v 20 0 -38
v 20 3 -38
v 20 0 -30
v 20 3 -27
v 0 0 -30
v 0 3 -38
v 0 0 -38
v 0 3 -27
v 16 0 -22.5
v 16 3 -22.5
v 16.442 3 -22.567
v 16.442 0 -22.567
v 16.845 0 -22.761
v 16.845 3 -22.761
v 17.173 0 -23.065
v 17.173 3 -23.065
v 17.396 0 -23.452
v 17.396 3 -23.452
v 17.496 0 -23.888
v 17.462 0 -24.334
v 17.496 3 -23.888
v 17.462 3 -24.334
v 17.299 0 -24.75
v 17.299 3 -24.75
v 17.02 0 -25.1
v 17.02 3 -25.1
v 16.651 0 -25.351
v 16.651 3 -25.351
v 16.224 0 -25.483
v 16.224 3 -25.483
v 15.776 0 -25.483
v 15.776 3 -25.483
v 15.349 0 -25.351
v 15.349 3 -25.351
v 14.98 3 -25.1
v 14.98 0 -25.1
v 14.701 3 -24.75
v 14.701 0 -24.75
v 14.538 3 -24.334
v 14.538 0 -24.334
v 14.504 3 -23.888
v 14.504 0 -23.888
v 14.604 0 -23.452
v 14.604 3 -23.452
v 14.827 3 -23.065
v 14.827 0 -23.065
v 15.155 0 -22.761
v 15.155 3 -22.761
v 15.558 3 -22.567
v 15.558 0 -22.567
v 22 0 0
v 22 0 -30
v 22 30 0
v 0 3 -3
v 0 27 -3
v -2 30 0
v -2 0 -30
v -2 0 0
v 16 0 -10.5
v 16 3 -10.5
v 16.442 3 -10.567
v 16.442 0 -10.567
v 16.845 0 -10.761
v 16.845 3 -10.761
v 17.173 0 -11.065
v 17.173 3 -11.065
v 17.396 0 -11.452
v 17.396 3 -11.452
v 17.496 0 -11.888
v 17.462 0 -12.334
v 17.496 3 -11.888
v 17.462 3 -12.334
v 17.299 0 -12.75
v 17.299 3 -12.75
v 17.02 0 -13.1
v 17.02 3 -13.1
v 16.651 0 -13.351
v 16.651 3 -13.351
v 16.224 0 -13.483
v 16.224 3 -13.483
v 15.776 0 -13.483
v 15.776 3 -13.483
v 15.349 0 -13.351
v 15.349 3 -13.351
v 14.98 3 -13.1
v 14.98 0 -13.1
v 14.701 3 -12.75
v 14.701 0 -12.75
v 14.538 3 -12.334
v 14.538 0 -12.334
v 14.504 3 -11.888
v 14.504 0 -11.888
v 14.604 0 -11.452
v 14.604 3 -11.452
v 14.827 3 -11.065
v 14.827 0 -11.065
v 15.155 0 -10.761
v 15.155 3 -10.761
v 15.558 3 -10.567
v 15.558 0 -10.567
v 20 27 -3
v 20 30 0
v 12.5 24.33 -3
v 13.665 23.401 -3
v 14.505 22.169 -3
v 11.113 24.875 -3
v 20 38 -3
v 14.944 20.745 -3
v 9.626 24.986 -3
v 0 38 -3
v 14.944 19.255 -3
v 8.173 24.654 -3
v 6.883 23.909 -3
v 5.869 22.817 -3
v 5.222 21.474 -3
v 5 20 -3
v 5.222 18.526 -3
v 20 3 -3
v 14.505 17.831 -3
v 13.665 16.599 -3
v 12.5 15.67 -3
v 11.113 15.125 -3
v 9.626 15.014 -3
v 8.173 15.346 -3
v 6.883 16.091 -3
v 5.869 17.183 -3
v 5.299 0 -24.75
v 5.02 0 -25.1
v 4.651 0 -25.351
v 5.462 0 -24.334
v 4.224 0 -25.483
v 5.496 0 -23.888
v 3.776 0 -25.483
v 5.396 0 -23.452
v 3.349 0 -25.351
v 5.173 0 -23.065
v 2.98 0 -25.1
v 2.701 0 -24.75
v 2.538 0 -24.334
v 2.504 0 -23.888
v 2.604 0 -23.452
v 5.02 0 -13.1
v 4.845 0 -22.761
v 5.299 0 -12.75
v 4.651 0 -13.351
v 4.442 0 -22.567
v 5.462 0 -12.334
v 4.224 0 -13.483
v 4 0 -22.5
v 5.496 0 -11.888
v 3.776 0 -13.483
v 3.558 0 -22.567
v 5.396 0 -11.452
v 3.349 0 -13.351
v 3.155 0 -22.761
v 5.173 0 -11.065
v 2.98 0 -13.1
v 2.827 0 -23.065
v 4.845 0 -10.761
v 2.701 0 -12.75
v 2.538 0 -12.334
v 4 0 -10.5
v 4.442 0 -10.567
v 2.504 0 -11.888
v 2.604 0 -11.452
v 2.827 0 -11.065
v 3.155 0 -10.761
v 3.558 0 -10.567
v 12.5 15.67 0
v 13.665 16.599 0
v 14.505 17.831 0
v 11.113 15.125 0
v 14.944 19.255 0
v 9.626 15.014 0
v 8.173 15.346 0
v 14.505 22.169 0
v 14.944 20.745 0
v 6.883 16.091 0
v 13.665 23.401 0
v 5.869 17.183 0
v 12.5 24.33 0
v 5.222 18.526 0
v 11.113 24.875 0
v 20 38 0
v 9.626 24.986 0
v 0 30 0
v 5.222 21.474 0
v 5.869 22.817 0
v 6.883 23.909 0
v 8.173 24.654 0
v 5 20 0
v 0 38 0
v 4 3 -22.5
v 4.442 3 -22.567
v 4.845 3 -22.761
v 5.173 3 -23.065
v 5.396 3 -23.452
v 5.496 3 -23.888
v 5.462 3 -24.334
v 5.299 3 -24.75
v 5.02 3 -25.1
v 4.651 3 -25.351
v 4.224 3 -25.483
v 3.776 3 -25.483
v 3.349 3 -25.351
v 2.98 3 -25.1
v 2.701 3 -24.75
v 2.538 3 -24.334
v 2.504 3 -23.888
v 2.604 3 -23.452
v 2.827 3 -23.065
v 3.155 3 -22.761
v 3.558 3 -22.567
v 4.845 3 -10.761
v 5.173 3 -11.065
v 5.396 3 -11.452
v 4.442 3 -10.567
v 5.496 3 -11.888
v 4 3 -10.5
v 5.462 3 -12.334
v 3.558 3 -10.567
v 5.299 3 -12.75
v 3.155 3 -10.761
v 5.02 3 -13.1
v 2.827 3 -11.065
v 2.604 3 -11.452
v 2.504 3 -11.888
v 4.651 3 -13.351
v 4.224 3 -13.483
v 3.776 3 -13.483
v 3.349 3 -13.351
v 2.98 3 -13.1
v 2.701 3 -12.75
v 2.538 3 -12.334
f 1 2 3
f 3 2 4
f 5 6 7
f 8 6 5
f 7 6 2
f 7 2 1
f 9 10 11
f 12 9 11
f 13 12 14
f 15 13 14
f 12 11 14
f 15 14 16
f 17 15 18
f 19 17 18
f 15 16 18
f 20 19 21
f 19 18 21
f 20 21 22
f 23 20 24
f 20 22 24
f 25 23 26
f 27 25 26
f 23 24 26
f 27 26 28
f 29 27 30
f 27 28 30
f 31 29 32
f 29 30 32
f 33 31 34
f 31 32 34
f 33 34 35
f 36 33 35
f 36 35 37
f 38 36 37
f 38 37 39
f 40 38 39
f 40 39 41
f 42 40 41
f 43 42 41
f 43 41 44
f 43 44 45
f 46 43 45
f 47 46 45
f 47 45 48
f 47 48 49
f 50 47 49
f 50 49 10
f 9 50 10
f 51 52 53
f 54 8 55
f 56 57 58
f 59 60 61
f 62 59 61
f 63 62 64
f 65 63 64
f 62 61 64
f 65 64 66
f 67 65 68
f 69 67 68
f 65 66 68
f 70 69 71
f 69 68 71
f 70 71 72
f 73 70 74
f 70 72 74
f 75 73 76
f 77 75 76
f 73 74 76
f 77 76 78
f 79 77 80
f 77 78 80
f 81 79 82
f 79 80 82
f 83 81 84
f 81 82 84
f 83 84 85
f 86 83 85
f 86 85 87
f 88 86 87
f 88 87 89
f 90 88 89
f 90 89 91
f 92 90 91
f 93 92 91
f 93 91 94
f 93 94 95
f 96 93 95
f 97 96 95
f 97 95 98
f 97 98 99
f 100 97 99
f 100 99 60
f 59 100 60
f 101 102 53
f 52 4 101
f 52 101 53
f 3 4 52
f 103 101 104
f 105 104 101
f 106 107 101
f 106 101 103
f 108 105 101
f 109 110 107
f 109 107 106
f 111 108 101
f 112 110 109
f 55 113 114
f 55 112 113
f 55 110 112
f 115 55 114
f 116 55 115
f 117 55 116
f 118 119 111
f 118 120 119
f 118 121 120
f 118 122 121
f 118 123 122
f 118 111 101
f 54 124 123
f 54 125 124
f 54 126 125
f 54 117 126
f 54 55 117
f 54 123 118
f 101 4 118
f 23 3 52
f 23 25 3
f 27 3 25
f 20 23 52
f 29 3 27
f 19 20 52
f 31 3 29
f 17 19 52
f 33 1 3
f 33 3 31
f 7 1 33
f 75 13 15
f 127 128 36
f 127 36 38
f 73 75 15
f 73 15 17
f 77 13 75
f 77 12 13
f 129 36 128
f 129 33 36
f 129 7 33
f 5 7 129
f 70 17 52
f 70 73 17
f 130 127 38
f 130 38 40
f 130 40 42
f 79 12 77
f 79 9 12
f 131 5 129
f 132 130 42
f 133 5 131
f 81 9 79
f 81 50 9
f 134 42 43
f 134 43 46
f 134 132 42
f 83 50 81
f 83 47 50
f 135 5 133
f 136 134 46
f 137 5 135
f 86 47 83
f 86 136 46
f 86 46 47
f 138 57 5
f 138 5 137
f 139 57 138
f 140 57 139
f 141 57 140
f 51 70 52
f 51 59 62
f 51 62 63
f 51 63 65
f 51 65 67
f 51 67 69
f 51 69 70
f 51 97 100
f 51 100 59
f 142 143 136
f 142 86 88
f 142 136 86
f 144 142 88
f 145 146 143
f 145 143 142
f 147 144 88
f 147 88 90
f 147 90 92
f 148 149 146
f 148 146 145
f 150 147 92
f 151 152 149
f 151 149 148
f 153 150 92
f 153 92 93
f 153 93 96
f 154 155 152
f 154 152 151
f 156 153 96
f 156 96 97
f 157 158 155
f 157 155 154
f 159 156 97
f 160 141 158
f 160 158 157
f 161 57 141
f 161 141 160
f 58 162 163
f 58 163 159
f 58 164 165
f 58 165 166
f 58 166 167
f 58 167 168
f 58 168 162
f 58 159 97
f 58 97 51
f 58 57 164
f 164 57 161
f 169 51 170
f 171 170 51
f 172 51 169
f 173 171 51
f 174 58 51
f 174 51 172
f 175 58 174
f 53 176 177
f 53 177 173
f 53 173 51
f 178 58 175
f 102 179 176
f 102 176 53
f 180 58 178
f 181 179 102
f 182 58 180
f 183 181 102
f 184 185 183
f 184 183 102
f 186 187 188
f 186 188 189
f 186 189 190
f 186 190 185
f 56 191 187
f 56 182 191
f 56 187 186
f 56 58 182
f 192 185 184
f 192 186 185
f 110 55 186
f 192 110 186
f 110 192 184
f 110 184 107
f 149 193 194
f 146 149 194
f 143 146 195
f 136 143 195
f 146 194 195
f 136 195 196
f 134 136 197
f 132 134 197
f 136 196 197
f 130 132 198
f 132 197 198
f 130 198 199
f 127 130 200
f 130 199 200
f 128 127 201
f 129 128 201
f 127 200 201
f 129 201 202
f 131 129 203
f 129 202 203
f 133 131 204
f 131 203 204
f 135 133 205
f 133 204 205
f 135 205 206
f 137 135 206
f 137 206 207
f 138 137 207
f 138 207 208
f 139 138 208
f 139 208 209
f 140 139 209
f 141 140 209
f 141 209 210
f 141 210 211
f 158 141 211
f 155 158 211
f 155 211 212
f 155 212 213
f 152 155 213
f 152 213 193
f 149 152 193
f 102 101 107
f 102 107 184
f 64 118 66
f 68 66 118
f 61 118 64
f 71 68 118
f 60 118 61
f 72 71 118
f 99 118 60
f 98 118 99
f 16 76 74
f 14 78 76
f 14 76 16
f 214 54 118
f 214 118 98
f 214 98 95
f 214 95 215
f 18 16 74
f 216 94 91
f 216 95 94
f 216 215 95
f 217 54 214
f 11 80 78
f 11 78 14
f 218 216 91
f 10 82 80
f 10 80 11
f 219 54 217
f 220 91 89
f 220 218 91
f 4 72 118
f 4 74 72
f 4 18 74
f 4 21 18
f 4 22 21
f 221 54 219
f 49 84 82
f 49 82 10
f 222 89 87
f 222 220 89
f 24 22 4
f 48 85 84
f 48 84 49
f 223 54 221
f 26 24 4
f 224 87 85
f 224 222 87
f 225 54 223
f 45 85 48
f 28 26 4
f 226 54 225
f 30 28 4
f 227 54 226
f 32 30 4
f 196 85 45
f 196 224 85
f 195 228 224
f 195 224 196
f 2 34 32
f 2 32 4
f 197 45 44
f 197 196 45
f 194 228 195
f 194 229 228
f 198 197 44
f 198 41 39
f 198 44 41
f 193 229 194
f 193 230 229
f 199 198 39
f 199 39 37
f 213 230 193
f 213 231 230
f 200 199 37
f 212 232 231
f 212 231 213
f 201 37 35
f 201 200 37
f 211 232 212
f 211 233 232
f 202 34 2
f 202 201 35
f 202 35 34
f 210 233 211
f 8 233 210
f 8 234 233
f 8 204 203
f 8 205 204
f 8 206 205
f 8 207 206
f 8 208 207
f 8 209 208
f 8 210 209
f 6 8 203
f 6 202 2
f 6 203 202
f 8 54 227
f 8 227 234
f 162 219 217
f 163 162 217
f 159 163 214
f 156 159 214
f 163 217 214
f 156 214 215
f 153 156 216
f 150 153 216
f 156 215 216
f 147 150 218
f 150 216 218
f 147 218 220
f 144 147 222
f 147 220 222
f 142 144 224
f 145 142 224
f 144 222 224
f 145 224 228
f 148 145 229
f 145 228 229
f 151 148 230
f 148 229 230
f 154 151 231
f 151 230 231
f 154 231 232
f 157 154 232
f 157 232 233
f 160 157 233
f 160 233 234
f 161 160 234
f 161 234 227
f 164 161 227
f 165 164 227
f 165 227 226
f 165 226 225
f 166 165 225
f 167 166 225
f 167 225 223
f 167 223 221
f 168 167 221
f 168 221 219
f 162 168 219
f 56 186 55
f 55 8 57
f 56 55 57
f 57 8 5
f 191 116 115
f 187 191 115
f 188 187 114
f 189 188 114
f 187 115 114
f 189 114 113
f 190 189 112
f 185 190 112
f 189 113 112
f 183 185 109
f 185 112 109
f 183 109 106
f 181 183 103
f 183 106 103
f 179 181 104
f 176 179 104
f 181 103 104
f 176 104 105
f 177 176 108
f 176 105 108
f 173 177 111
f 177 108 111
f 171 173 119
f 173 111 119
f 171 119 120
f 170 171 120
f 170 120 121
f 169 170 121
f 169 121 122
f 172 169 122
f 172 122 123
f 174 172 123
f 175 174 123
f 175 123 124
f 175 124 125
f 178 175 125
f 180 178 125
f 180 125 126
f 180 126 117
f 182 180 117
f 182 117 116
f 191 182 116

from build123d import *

# Parameters (mm, degrees)
EXTRUDE_1_DEPTH     = 20
SKETCH_3_R          = 1.5
CUT_EXTRUDE_1_DEPTH = 56.398555938
SKETCH_5_R          = 5
CUT_EXTRUDE_3_DEPTH = 56.398555938
EXTRUDE_2_DEPTH     = 2
EXTRUDE_3_DEPTH     = 2


with BuildPart() as part:
    # 草图1 → 凸台-拉伸1 (new body)
    with BuildSketch(Plane(origin=(0, 0, 0), x_dir=(0, 0, -1), z_dir=(1, 0, 0))):
        Polygon((0, 0), (0, 38), (3, 38), (3, 3), (38, 3), (38, 0), align=None)
    extrude(amount=EXTRUDE_1_DEPTH)

    # 草图3 → 切除-拉伸1 (cut, through all)
    with BuildSketch(Plane(origin=(0, 3, 0), x_dir=(1, 0, 0), z_dir=(0, 1, 0))):
        with Locations(Location((16, 12, 0), (0, 0, 270))):
            Circle(SKETCH_3_R)
        with Locations(Location((4, 12, 0), (0, 0, 270))):
            Circle(SKETCH_3_R)
        with Locations(Location((4, 24, 0), (0, 0, 270))):
            Circle(SKETCH_3_R)
        with Locations(Location((16, 24, 0), (0, 0, 270))):
            Circle(SKETCH_3_R)
    extrude(amount=-CUT_EXTRUDE_1_DEPTH, mode=Mode.SUBTRACT)

    # 草图5 → 切除-拉伸3 (cut, through all)
    with BuildSketch(Plane(origin=(0, 0, -3), x_dir=(-1, 0, 0), z_dir=(0, 0, -1))):
        with Locations((-10, 20)):
            Circle(SKETCH_5_R)
    extrude(amount=-CUT_EXTRUDE_3_DEPTH, mode=Mode.SUBTRACT)

    # 草图6 → 凸台-拉伸2 (add)
    with BuildSketch(Plane.ZY):
        Polygon((0, 0), (0, 30), (-30, 0), align=None)
    extrude(amount=EXTRUDE_2_DEPTH)

    # 草图7 → 凸台-拉伸3 (add)
    with BuildSketch(Plane(origin=(20, 0, 0), x_dir=(0, 0, -1), z_dir=(1, 0, 0))):
        Polygon((0, 0), (0, 30), (30, 0), align=None)
    extrude(amount=EXTRUDE_3_DEPTH)


solid = part.part
